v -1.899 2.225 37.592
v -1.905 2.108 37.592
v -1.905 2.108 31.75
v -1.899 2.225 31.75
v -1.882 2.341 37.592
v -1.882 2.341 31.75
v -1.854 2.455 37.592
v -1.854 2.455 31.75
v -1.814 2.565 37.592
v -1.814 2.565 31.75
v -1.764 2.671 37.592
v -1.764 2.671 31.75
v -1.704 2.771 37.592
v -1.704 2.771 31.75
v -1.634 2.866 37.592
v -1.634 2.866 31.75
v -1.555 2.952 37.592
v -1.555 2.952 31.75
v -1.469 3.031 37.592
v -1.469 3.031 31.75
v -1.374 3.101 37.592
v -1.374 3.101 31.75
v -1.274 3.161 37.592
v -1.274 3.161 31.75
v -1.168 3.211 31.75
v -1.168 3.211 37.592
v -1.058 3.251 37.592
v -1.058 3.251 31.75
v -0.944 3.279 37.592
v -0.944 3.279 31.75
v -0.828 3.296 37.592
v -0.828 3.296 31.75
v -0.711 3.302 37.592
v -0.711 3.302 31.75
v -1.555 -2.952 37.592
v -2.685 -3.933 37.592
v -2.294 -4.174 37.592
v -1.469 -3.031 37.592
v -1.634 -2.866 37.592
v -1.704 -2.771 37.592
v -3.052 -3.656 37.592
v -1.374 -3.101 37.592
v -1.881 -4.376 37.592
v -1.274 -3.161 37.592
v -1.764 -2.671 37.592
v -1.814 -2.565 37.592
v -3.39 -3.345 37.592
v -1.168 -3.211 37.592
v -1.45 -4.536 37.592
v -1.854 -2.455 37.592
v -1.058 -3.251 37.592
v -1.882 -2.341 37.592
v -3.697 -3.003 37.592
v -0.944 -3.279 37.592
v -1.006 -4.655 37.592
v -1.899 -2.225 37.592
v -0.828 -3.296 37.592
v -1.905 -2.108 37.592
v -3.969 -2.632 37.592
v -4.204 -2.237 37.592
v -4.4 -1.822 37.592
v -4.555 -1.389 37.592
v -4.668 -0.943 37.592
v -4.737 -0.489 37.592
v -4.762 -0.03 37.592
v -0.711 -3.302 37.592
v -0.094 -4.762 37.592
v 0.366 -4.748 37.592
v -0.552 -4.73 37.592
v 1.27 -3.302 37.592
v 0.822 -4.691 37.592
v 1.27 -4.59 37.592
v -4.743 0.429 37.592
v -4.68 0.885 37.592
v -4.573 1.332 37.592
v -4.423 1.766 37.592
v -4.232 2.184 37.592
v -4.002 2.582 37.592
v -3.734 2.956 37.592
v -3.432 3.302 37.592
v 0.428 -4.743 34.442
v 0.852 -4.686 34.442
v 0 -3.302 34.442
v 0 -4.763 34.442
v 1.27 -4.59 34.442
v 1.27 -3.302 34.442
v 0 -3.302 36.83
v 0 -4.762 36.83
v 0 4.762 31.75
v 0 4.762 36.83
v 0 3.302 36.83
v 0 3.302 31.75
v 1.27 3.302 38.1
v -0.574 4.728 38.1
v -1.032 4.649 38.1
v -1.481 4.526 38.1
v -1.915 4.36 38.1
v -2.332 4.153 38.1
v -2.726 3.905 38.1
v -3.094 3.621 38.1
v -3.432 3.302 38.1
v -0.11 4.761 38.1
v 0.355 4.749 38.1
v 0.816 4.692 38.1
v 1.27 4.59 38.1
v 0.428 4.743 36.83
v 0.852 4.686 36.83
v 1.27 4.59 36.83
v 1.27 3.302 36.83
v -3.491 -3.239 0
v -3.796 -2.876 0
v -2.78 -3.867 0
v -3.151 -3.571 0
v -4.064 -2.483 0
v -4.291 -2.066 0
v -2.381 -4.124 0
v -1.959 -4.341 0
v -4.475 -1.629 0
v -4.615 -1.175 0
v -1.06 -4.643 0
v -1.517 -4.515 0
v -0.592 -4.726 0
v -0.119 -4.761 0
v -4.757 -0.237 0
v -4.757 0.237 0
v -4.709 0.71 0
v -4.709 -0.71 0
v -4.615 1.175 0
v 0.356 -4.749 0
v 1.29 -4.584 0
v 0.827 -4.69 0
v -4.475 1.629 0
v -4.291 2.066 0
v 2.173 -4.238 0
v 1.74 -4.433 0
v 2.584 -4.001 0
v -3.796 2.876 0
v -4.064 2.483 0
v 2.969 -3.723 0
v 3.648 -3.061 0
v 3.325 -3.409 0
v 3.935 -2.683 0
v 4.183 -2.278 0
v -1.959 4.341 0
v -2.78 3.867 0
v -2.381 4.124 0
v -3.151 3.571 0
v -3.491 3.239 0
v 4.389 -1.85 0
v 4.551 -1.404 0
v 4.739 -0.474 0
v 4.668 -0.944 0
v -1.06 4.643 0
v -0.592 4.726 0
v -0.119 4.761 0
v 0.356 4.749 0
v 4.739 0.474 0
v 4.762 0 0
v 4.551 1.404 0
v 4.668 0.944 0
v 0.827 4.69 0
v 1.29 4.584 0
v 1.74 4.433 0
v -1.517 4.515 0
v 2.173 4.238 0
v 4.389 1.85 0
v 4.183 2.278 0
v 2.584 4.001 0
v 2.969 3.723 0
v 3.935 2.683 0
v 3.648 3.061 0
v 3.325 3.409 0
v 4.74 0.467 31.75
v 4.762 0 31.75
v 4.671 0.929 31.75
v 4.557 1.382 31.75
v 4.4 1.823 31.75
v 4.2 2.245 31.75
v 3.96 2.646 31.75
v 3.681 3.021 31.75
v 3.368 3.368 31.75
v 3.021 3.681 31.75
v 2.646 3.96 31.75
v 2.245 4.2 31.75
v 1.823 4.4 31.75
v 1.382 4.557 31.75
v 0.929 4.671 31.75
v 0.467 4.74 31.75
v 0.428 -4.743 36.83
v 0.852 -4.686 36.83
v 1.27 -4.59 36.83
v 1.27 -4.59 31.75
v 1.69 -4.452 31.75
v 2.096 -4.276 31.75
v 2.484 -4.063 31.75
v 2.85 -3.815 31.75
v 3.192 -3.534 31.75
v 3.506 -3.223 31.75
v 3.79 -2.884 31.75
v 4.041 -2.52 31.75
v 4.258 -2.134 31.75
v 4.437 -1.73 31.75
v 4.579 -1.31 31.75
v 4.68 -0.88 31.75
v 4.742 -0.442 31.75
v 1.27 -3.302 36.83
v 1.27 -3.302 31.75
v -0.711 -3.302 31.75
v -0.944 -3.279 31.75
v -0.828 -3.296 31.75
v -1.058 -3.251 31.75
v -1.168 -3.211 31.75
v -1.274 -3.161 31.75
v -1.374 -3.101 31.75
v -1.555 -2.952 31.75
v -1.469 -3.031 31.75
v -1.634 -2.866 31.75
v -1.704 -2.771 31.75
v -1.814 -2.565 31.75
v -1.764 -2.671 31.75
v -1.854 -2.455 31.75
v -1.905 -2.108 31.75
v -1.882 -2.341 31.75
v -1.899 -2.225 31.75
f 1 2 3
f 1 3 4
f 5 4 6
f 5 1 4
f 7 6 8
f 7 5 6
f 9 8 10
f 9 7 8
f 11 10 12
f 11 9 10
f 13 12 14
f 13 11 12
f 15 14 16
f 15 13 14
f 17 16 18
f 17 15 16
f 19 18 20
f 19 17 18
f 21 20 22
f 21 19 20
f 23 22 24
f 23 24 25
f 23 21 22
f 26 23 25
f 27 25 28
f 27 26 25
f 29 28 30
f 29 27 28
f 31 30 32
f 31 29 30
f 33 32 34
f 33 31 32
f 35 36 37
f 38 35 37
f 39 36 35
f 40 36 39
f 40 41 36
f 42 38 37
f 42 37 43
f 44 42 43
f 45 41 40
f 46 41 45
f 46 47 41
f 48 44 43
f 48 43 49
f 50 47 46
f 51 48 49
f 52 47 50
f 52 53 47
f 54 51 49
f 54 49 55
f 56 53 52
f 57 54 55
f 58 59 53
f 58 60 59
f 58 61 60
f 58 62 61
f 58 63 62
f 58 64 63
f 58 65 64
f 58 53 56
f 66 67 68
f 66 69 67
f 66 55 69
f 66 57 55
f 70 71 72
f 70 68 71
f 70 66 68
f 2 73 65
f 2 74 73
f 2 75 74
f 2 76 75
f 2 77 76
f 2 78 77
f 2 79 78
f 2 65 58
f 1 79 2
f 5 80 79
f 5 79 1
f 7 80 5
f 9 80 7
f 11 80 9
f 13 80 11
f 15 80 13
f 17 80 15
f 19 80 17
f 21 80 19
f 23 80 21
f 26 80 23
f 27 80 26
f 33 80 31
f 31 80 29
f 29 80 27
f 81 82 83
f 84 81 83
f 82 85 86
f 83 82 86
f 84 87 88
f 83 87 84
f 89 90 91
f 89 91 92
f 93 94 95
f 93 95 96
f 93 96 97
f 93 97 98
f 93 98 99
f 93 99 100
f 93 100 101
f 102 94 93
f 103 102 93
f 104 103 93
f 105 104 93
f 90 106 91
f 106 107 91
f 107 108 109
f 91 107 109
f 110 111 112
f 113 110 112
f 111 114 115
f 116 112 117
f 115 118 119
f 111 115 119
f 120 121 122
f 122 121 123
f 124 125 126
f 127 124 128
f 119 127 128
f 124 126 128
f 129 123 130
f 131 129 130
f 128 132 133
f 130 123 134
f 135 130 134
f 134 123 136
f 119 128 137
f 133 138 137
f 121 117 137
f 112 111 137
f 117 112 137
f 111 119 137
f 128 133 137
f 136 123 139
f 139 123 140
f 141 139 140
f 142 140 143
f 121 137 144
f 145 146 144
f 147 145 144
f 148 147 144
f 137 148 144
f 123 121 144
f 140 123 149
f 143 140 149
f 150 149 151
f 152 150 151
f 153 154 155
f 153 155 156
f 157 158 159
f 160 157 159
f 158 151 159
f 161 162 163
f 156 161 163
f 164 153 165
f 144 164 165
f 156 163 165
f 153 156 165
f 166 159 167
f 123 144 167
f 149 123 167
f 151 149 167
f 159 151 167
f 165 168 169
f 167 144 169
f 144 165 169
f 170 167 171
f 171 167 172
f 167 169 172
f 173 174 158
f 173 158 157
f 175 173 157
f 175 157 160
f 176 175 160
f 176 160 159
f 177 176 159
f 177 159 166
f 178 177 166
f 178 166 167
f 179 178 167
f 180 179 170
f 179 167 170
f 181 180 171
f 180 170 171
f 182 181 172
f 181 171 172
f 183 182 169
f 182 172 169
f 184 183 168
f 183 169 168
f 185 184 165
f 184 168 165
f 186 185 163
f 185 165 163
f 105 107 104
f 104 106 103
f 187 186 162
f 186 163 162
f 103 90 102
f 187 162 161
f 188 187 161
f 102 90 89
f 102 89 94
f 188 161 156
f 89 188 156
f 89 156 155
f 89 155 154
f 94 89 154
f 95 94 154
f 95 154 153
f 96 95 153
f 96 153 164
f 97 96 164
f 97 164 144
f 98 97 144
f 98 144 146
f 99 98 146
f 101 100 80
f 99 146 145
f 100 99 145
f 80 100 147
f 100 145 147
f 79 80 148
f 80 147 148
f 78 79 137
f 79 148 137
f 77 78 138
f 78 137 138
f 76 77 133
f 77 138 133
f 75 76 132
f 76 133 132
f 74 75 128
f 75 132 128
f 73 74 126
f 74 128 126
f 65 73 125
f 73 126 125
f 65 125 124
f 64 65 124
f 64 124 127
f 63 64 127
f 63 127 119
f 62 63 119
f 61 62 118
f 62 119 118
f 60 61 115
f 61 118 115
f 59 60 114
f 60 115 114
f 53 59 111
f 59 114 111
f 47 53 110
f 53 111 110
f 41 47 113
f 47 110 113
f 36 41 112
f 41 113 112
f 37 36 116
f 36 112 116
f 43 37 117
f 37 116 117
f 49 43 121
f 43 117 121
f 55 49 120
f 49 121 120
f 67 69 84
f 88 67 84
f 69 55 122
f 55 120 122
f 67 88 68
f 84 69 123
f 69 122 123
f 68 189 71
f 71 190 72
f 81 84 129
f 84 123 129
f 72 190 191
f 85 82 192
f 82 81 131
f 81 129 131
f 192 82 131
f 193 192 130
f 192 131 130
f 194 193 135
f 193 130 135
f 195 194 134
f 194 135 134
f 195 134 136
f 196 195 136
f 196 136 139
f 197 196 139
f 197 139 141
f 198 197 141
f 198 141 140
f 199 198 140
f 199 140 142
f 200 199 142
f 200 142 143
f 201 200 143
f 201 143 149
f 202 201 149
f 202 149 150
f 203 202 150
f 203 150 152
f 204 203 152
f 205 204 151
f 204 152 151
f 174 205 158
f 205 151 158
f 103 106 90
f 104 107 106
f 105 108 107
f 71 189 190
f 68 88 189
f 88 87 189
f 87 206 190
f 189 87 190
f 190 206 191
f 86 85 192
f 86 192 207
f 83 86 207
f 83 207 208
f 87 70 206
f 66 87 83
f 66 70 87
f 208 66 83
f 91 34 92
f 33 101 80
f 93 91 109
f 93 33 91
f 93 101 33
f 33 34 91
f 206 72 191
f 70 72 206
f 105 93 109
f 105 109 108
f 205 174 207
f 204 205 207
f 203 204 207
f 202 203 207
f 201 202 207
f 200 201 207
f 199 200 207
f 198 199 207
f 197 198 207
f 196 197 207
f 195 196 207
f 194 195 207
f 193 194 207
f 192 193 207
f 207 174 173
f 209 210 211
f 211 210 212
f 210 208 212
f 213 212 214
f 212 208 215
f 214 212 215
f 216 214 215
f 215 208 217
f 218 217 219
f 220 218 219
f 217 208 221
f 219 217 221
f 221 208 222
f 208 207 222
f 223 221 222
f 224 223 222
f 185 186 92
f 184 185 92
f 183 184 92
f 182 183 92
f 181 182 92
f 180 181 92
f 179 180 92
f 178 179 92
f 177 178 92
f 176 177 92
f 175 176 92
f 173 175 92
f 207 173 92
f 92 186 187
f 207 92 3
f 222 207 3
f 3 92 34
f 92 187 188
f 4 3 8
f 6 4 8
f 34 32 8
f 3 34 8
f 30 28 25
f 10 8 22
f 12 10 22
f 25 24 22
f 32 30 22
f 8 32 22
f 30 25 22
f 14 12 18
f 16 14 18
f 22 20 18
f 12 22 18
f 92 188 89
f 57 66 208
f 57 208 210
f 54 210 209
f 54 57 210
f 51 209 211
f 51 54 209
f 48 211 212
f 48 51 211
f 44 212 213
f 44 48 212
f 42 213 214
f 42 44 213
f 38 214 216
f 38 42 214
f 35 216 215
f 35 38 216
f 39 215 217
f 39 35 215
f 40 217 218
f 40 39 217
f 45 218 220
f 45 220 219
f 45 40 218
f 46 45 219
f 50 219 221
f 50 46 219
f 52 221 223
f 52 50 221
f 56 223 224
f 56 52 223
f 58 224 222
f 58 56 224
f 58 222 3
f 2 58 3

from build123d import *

# Parameters (mm, degrees)
SKETCH1_R      = 4.7625
EXTRUDE1_DEPTH = 38.1
EXTRUDE2_DEPTH = 6.35
SKETCH4_W      = 11.994523233
SKETCH4_H      = 10.10814551
EXTRUDE4_DEPTH = 0.508
EXTRUDE5_DEPTH = 1.27


with BuildPart() as part:
    # Sketch1 → Extrude1 (new body)
    with BuildSketch(Plane.XY):
        Circle(SKETCH1_R)
    extrude(amount=EXTRUDE1_DEPTH)

    # Sketch2 → Extrude2 (cut)
    with BuildSketch(Plane.XY.offset(38.1)):
        with BuildLine():
            Line((-0.7112, 3.302), (1.27, 3.302))
            Line((1.27, 3.302), (1.27, 10.556011527))
            Line((1.27, 10.556011527), (23.809552604, 10.556011527))
            Line((23.809552604, 10.556011527), (23.809552604, -10.556011527))
            Line((23.809552604, -10.556011527), (1.27, -10.556011527))
            Line((1.27, -10.556011527), (1.27, -3.302))
            Line((1.27, -3.302), (-0.7112, -3.302))
            ThreePointArc((-0.7112, -3.302), (-1.555344075, -2.952344075), (-1.905, -2.1082))
            Line((-1.905, -2.1082), (-1.905, 2.1082))
            ThreePointArc((-1.905, 2.1082), (-1.555344075, 2.952344075), (-0.7112, 3.302))
        make_face()
    extrude(amount=-EXTRUDE2_DEPTH, mode=Mode.SUBTRACT)

    # Sketch4 → Extrude4 (cut)
    with BuildSketch(Plane.XY.offset(38.1)):
        with Locations((-0.260671281, -1.752072755)):
            Rectangle(SKETCH4_W, SKETCH4_H)
    extrude(amount=-EXTRUDE4_DEPTH, mode=Mode.SUBTRACT)

    # Sketch5 → Extrude5 (cut)
    with BuildSketch(Plane(origin=(1.27, 0, 0), x_dir=(0, 0, -1), z_dir=(1, 0, 0))):
        Polygon((-36.83, 5.902578594), (-36.83, -11.457674659), (-34.4424, -11.457674659), (-34.4424, 3.302), (-31.75, 3.302), (-31.75, 5.902578594), align=None)
    extrude(amount=-EXTRUDE5_DEPTH, mode=Mode.SUBTRACT)


solid = part.part
